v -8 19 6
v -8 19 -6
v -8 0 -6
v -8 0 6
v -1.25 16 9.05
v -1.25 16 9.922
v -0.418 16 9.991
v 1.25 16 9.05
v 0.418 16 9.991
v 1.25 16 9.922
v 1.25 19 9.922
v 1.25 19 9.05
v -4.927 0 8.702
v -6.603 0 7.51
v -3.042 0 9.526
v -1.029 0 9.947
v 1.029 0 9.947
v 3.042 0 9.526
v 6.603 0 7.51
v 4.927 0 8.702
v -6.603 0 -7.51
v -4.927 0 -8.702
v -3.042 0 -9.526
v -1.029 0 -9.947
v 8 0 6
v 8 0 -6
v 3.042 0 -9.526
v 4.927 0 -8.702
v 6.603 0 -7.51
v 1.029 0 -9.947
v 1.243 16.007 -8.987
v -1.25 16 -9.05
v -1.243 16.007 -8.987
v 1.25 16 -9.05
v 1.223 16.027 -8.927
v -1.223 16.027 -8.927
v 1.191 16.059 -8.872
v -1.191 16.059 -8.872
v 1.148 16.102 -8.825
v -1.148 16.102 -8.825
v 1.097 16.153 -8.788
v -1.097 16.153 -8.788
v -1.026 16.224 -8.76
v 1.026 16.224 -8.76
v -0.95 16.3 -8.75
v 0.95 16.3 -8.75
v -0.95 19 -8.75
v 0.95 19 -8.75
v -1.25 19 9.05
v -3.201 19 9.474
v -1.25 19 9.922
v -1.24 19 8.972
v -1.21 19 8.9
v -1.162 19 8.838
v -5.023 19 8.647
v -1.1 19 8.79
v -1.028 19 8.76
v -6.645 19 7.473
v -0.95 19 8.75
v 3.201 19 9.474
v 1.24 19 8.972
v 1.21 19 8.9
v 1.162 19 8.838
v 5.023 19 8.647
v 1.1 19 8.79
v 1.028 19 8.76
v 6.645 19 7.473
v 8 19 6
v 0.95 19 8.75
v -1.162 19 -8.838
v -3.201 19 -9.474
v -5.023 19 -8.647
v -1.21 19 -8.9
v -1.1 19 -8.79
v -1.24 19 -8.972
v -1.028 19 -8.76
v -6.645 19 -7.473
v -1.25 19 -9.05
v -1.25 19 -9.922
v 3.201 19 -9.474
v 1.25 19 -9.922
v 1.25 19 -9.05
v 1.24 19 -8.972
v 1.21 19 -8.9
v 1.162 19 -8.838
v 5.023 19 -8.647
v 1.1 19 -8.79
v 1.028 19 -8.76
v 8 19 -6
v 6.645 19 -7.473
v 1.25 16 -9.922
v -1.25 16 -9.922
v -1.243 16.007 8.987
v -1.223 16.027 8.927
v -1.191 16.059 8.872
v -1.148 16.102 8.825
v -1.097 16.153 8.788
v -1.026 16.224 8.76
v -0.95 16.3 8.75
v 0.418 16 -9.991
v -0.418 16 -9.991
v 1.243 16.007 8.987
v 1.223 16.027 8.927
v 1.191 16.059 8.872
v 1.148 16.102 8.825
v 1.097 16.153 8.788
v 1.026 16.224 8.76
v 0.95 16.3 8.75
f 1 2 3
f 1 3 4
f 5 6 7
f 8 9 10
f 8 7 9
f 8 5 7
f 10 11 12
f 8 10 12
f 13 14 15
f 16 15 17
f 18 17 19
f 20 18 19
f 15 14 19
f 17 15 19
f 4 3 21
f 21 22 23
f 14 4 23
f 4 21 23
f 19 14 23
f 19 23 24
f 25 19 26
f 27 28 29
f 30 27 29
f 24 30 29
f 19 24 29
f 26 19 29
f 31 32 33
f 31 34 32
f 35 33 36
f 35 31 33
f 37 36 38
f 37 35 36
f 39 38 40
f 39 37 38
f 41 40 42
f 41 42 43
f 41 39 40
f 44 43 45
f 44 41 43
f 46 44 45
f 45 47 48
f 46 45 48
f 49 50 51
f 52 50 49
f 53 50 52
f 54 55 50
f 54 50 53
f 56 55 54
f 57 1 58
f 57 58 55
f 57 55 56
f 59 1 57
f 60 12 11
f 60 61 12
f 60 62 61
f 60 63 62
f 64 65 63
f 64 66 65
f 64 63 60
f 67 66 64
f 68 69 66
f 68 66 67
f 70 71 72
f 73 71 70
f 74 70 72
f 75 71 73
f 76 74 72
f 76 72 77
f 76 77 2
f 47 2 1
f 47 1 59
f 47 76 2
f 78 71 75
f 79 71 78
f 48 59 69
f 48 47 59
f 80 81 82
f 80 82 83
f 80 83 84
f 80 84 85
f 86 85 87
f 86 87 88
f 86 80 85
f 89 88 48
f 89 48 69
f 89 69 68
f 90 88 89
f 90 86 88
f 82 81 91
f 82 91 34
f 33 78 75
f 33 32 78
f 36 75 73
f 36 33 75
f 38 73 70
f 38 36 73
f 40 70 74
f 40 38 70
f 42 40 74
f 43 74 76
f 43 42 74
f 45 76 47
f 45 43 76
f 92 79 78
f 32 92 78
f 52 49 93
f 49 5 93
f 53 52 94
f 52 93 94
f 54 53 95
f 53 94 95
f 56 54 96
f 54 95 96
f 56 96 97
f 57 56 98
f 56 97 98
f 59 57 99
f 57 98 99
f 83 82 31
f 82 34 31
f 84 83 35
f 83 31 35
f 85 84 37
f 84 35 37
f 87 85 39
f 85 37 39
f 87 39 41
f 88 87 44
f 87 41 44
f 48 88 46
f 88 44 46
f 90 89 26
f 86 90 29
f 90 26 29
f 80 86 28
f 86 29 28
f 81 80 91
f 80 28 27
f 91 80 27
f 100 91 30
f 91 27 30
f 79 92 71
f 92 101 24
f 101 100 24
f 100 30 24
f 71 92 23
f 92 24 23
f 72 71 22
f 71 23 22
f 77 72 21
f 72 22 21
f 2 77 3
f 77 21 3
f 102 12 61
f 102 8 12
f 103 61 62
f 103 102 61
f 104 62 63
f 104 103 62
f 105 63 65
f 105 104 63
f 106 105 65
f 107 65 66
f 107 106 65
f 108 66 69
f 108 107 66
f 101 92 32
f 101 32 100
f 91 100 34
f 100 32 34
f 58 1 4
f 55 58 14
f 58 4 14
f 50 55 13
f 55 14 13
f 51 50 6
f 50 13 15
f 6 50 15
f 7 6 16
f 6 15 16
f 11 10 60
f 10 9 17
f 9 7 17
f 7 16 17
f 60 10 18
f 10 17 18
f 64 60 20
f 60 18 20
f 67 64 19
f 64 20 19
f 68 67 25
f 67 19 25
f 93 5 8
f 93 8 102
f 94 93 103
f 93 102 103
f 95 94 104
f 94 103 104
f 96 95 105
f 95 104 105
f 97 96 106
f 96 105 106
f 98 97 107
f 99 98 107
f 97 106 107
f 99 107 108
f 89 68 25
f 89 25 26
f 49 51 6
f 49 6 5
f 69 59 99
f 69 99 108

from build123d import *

# Parameters (mm, degrees)
BOSS_EXTRUDE1_DEPTH = 19
SKETCH2_W           = 2.5
SKETCH2_H           = 2.5
CUT_EXTRUDE1_DEPTH  = 3
FILLET1_R           = 0.3


with BuildPart() as part:
    # Sketch1 → Boss-Extrude1 (new body)
    with BuildSketch(Plane(origin=(0, 0, 0), x_dir=(1, 0, 0), z_dir=(0, 1, 0))):
        with BuildLine():
            Line((8, -6), (8, 6))
            ThreePointArc((8, 6), (0, 10), (-8, 6))
            Line((-8, 6), (-8, -6))
            ThreePointArc((-8, -6), (0, -10), (8, -6))
        make_face()
    extrude(amount=BOSS_EXTRUDE1_DEPTH)

    # Sketch2 → Cut-Extrude1 (cut)
    with BuildSketch(Plane(origin=(0, 19, 0), x_dir=(1, 0, 0), z_dir=(0, 1, 0))):
        with Locations((0, -10)):
            Rectangle(SKETCH2_W, SKETCH2_H)
    cut_extrude1 = extrude(amount=-CUT_EXTRUDE1_DEPTH, mode=Mode.SUBTRACT)

    # Mirror1: Cut-Extrude1 across plane
    add(cut_extrude1.mirror(Plane.XY), mode=Mode.SUBTRACT)

    # Fillet1
    fillet1_edges = [part.edges().sort_by_distance(p)[0] for p in [
        (1.25, 17.5, 8.75),
        (0, 16, 8.75),
        (-1.25, 17.5, 8.75),
        (0, 16, -8.75),
        (-1.25, 17.5, -8.75),
        (1.25, 17.5, -8.75),
    ]]
    fillet(fillet1_edges, radius=FILLET1_R)


solid = part.part
